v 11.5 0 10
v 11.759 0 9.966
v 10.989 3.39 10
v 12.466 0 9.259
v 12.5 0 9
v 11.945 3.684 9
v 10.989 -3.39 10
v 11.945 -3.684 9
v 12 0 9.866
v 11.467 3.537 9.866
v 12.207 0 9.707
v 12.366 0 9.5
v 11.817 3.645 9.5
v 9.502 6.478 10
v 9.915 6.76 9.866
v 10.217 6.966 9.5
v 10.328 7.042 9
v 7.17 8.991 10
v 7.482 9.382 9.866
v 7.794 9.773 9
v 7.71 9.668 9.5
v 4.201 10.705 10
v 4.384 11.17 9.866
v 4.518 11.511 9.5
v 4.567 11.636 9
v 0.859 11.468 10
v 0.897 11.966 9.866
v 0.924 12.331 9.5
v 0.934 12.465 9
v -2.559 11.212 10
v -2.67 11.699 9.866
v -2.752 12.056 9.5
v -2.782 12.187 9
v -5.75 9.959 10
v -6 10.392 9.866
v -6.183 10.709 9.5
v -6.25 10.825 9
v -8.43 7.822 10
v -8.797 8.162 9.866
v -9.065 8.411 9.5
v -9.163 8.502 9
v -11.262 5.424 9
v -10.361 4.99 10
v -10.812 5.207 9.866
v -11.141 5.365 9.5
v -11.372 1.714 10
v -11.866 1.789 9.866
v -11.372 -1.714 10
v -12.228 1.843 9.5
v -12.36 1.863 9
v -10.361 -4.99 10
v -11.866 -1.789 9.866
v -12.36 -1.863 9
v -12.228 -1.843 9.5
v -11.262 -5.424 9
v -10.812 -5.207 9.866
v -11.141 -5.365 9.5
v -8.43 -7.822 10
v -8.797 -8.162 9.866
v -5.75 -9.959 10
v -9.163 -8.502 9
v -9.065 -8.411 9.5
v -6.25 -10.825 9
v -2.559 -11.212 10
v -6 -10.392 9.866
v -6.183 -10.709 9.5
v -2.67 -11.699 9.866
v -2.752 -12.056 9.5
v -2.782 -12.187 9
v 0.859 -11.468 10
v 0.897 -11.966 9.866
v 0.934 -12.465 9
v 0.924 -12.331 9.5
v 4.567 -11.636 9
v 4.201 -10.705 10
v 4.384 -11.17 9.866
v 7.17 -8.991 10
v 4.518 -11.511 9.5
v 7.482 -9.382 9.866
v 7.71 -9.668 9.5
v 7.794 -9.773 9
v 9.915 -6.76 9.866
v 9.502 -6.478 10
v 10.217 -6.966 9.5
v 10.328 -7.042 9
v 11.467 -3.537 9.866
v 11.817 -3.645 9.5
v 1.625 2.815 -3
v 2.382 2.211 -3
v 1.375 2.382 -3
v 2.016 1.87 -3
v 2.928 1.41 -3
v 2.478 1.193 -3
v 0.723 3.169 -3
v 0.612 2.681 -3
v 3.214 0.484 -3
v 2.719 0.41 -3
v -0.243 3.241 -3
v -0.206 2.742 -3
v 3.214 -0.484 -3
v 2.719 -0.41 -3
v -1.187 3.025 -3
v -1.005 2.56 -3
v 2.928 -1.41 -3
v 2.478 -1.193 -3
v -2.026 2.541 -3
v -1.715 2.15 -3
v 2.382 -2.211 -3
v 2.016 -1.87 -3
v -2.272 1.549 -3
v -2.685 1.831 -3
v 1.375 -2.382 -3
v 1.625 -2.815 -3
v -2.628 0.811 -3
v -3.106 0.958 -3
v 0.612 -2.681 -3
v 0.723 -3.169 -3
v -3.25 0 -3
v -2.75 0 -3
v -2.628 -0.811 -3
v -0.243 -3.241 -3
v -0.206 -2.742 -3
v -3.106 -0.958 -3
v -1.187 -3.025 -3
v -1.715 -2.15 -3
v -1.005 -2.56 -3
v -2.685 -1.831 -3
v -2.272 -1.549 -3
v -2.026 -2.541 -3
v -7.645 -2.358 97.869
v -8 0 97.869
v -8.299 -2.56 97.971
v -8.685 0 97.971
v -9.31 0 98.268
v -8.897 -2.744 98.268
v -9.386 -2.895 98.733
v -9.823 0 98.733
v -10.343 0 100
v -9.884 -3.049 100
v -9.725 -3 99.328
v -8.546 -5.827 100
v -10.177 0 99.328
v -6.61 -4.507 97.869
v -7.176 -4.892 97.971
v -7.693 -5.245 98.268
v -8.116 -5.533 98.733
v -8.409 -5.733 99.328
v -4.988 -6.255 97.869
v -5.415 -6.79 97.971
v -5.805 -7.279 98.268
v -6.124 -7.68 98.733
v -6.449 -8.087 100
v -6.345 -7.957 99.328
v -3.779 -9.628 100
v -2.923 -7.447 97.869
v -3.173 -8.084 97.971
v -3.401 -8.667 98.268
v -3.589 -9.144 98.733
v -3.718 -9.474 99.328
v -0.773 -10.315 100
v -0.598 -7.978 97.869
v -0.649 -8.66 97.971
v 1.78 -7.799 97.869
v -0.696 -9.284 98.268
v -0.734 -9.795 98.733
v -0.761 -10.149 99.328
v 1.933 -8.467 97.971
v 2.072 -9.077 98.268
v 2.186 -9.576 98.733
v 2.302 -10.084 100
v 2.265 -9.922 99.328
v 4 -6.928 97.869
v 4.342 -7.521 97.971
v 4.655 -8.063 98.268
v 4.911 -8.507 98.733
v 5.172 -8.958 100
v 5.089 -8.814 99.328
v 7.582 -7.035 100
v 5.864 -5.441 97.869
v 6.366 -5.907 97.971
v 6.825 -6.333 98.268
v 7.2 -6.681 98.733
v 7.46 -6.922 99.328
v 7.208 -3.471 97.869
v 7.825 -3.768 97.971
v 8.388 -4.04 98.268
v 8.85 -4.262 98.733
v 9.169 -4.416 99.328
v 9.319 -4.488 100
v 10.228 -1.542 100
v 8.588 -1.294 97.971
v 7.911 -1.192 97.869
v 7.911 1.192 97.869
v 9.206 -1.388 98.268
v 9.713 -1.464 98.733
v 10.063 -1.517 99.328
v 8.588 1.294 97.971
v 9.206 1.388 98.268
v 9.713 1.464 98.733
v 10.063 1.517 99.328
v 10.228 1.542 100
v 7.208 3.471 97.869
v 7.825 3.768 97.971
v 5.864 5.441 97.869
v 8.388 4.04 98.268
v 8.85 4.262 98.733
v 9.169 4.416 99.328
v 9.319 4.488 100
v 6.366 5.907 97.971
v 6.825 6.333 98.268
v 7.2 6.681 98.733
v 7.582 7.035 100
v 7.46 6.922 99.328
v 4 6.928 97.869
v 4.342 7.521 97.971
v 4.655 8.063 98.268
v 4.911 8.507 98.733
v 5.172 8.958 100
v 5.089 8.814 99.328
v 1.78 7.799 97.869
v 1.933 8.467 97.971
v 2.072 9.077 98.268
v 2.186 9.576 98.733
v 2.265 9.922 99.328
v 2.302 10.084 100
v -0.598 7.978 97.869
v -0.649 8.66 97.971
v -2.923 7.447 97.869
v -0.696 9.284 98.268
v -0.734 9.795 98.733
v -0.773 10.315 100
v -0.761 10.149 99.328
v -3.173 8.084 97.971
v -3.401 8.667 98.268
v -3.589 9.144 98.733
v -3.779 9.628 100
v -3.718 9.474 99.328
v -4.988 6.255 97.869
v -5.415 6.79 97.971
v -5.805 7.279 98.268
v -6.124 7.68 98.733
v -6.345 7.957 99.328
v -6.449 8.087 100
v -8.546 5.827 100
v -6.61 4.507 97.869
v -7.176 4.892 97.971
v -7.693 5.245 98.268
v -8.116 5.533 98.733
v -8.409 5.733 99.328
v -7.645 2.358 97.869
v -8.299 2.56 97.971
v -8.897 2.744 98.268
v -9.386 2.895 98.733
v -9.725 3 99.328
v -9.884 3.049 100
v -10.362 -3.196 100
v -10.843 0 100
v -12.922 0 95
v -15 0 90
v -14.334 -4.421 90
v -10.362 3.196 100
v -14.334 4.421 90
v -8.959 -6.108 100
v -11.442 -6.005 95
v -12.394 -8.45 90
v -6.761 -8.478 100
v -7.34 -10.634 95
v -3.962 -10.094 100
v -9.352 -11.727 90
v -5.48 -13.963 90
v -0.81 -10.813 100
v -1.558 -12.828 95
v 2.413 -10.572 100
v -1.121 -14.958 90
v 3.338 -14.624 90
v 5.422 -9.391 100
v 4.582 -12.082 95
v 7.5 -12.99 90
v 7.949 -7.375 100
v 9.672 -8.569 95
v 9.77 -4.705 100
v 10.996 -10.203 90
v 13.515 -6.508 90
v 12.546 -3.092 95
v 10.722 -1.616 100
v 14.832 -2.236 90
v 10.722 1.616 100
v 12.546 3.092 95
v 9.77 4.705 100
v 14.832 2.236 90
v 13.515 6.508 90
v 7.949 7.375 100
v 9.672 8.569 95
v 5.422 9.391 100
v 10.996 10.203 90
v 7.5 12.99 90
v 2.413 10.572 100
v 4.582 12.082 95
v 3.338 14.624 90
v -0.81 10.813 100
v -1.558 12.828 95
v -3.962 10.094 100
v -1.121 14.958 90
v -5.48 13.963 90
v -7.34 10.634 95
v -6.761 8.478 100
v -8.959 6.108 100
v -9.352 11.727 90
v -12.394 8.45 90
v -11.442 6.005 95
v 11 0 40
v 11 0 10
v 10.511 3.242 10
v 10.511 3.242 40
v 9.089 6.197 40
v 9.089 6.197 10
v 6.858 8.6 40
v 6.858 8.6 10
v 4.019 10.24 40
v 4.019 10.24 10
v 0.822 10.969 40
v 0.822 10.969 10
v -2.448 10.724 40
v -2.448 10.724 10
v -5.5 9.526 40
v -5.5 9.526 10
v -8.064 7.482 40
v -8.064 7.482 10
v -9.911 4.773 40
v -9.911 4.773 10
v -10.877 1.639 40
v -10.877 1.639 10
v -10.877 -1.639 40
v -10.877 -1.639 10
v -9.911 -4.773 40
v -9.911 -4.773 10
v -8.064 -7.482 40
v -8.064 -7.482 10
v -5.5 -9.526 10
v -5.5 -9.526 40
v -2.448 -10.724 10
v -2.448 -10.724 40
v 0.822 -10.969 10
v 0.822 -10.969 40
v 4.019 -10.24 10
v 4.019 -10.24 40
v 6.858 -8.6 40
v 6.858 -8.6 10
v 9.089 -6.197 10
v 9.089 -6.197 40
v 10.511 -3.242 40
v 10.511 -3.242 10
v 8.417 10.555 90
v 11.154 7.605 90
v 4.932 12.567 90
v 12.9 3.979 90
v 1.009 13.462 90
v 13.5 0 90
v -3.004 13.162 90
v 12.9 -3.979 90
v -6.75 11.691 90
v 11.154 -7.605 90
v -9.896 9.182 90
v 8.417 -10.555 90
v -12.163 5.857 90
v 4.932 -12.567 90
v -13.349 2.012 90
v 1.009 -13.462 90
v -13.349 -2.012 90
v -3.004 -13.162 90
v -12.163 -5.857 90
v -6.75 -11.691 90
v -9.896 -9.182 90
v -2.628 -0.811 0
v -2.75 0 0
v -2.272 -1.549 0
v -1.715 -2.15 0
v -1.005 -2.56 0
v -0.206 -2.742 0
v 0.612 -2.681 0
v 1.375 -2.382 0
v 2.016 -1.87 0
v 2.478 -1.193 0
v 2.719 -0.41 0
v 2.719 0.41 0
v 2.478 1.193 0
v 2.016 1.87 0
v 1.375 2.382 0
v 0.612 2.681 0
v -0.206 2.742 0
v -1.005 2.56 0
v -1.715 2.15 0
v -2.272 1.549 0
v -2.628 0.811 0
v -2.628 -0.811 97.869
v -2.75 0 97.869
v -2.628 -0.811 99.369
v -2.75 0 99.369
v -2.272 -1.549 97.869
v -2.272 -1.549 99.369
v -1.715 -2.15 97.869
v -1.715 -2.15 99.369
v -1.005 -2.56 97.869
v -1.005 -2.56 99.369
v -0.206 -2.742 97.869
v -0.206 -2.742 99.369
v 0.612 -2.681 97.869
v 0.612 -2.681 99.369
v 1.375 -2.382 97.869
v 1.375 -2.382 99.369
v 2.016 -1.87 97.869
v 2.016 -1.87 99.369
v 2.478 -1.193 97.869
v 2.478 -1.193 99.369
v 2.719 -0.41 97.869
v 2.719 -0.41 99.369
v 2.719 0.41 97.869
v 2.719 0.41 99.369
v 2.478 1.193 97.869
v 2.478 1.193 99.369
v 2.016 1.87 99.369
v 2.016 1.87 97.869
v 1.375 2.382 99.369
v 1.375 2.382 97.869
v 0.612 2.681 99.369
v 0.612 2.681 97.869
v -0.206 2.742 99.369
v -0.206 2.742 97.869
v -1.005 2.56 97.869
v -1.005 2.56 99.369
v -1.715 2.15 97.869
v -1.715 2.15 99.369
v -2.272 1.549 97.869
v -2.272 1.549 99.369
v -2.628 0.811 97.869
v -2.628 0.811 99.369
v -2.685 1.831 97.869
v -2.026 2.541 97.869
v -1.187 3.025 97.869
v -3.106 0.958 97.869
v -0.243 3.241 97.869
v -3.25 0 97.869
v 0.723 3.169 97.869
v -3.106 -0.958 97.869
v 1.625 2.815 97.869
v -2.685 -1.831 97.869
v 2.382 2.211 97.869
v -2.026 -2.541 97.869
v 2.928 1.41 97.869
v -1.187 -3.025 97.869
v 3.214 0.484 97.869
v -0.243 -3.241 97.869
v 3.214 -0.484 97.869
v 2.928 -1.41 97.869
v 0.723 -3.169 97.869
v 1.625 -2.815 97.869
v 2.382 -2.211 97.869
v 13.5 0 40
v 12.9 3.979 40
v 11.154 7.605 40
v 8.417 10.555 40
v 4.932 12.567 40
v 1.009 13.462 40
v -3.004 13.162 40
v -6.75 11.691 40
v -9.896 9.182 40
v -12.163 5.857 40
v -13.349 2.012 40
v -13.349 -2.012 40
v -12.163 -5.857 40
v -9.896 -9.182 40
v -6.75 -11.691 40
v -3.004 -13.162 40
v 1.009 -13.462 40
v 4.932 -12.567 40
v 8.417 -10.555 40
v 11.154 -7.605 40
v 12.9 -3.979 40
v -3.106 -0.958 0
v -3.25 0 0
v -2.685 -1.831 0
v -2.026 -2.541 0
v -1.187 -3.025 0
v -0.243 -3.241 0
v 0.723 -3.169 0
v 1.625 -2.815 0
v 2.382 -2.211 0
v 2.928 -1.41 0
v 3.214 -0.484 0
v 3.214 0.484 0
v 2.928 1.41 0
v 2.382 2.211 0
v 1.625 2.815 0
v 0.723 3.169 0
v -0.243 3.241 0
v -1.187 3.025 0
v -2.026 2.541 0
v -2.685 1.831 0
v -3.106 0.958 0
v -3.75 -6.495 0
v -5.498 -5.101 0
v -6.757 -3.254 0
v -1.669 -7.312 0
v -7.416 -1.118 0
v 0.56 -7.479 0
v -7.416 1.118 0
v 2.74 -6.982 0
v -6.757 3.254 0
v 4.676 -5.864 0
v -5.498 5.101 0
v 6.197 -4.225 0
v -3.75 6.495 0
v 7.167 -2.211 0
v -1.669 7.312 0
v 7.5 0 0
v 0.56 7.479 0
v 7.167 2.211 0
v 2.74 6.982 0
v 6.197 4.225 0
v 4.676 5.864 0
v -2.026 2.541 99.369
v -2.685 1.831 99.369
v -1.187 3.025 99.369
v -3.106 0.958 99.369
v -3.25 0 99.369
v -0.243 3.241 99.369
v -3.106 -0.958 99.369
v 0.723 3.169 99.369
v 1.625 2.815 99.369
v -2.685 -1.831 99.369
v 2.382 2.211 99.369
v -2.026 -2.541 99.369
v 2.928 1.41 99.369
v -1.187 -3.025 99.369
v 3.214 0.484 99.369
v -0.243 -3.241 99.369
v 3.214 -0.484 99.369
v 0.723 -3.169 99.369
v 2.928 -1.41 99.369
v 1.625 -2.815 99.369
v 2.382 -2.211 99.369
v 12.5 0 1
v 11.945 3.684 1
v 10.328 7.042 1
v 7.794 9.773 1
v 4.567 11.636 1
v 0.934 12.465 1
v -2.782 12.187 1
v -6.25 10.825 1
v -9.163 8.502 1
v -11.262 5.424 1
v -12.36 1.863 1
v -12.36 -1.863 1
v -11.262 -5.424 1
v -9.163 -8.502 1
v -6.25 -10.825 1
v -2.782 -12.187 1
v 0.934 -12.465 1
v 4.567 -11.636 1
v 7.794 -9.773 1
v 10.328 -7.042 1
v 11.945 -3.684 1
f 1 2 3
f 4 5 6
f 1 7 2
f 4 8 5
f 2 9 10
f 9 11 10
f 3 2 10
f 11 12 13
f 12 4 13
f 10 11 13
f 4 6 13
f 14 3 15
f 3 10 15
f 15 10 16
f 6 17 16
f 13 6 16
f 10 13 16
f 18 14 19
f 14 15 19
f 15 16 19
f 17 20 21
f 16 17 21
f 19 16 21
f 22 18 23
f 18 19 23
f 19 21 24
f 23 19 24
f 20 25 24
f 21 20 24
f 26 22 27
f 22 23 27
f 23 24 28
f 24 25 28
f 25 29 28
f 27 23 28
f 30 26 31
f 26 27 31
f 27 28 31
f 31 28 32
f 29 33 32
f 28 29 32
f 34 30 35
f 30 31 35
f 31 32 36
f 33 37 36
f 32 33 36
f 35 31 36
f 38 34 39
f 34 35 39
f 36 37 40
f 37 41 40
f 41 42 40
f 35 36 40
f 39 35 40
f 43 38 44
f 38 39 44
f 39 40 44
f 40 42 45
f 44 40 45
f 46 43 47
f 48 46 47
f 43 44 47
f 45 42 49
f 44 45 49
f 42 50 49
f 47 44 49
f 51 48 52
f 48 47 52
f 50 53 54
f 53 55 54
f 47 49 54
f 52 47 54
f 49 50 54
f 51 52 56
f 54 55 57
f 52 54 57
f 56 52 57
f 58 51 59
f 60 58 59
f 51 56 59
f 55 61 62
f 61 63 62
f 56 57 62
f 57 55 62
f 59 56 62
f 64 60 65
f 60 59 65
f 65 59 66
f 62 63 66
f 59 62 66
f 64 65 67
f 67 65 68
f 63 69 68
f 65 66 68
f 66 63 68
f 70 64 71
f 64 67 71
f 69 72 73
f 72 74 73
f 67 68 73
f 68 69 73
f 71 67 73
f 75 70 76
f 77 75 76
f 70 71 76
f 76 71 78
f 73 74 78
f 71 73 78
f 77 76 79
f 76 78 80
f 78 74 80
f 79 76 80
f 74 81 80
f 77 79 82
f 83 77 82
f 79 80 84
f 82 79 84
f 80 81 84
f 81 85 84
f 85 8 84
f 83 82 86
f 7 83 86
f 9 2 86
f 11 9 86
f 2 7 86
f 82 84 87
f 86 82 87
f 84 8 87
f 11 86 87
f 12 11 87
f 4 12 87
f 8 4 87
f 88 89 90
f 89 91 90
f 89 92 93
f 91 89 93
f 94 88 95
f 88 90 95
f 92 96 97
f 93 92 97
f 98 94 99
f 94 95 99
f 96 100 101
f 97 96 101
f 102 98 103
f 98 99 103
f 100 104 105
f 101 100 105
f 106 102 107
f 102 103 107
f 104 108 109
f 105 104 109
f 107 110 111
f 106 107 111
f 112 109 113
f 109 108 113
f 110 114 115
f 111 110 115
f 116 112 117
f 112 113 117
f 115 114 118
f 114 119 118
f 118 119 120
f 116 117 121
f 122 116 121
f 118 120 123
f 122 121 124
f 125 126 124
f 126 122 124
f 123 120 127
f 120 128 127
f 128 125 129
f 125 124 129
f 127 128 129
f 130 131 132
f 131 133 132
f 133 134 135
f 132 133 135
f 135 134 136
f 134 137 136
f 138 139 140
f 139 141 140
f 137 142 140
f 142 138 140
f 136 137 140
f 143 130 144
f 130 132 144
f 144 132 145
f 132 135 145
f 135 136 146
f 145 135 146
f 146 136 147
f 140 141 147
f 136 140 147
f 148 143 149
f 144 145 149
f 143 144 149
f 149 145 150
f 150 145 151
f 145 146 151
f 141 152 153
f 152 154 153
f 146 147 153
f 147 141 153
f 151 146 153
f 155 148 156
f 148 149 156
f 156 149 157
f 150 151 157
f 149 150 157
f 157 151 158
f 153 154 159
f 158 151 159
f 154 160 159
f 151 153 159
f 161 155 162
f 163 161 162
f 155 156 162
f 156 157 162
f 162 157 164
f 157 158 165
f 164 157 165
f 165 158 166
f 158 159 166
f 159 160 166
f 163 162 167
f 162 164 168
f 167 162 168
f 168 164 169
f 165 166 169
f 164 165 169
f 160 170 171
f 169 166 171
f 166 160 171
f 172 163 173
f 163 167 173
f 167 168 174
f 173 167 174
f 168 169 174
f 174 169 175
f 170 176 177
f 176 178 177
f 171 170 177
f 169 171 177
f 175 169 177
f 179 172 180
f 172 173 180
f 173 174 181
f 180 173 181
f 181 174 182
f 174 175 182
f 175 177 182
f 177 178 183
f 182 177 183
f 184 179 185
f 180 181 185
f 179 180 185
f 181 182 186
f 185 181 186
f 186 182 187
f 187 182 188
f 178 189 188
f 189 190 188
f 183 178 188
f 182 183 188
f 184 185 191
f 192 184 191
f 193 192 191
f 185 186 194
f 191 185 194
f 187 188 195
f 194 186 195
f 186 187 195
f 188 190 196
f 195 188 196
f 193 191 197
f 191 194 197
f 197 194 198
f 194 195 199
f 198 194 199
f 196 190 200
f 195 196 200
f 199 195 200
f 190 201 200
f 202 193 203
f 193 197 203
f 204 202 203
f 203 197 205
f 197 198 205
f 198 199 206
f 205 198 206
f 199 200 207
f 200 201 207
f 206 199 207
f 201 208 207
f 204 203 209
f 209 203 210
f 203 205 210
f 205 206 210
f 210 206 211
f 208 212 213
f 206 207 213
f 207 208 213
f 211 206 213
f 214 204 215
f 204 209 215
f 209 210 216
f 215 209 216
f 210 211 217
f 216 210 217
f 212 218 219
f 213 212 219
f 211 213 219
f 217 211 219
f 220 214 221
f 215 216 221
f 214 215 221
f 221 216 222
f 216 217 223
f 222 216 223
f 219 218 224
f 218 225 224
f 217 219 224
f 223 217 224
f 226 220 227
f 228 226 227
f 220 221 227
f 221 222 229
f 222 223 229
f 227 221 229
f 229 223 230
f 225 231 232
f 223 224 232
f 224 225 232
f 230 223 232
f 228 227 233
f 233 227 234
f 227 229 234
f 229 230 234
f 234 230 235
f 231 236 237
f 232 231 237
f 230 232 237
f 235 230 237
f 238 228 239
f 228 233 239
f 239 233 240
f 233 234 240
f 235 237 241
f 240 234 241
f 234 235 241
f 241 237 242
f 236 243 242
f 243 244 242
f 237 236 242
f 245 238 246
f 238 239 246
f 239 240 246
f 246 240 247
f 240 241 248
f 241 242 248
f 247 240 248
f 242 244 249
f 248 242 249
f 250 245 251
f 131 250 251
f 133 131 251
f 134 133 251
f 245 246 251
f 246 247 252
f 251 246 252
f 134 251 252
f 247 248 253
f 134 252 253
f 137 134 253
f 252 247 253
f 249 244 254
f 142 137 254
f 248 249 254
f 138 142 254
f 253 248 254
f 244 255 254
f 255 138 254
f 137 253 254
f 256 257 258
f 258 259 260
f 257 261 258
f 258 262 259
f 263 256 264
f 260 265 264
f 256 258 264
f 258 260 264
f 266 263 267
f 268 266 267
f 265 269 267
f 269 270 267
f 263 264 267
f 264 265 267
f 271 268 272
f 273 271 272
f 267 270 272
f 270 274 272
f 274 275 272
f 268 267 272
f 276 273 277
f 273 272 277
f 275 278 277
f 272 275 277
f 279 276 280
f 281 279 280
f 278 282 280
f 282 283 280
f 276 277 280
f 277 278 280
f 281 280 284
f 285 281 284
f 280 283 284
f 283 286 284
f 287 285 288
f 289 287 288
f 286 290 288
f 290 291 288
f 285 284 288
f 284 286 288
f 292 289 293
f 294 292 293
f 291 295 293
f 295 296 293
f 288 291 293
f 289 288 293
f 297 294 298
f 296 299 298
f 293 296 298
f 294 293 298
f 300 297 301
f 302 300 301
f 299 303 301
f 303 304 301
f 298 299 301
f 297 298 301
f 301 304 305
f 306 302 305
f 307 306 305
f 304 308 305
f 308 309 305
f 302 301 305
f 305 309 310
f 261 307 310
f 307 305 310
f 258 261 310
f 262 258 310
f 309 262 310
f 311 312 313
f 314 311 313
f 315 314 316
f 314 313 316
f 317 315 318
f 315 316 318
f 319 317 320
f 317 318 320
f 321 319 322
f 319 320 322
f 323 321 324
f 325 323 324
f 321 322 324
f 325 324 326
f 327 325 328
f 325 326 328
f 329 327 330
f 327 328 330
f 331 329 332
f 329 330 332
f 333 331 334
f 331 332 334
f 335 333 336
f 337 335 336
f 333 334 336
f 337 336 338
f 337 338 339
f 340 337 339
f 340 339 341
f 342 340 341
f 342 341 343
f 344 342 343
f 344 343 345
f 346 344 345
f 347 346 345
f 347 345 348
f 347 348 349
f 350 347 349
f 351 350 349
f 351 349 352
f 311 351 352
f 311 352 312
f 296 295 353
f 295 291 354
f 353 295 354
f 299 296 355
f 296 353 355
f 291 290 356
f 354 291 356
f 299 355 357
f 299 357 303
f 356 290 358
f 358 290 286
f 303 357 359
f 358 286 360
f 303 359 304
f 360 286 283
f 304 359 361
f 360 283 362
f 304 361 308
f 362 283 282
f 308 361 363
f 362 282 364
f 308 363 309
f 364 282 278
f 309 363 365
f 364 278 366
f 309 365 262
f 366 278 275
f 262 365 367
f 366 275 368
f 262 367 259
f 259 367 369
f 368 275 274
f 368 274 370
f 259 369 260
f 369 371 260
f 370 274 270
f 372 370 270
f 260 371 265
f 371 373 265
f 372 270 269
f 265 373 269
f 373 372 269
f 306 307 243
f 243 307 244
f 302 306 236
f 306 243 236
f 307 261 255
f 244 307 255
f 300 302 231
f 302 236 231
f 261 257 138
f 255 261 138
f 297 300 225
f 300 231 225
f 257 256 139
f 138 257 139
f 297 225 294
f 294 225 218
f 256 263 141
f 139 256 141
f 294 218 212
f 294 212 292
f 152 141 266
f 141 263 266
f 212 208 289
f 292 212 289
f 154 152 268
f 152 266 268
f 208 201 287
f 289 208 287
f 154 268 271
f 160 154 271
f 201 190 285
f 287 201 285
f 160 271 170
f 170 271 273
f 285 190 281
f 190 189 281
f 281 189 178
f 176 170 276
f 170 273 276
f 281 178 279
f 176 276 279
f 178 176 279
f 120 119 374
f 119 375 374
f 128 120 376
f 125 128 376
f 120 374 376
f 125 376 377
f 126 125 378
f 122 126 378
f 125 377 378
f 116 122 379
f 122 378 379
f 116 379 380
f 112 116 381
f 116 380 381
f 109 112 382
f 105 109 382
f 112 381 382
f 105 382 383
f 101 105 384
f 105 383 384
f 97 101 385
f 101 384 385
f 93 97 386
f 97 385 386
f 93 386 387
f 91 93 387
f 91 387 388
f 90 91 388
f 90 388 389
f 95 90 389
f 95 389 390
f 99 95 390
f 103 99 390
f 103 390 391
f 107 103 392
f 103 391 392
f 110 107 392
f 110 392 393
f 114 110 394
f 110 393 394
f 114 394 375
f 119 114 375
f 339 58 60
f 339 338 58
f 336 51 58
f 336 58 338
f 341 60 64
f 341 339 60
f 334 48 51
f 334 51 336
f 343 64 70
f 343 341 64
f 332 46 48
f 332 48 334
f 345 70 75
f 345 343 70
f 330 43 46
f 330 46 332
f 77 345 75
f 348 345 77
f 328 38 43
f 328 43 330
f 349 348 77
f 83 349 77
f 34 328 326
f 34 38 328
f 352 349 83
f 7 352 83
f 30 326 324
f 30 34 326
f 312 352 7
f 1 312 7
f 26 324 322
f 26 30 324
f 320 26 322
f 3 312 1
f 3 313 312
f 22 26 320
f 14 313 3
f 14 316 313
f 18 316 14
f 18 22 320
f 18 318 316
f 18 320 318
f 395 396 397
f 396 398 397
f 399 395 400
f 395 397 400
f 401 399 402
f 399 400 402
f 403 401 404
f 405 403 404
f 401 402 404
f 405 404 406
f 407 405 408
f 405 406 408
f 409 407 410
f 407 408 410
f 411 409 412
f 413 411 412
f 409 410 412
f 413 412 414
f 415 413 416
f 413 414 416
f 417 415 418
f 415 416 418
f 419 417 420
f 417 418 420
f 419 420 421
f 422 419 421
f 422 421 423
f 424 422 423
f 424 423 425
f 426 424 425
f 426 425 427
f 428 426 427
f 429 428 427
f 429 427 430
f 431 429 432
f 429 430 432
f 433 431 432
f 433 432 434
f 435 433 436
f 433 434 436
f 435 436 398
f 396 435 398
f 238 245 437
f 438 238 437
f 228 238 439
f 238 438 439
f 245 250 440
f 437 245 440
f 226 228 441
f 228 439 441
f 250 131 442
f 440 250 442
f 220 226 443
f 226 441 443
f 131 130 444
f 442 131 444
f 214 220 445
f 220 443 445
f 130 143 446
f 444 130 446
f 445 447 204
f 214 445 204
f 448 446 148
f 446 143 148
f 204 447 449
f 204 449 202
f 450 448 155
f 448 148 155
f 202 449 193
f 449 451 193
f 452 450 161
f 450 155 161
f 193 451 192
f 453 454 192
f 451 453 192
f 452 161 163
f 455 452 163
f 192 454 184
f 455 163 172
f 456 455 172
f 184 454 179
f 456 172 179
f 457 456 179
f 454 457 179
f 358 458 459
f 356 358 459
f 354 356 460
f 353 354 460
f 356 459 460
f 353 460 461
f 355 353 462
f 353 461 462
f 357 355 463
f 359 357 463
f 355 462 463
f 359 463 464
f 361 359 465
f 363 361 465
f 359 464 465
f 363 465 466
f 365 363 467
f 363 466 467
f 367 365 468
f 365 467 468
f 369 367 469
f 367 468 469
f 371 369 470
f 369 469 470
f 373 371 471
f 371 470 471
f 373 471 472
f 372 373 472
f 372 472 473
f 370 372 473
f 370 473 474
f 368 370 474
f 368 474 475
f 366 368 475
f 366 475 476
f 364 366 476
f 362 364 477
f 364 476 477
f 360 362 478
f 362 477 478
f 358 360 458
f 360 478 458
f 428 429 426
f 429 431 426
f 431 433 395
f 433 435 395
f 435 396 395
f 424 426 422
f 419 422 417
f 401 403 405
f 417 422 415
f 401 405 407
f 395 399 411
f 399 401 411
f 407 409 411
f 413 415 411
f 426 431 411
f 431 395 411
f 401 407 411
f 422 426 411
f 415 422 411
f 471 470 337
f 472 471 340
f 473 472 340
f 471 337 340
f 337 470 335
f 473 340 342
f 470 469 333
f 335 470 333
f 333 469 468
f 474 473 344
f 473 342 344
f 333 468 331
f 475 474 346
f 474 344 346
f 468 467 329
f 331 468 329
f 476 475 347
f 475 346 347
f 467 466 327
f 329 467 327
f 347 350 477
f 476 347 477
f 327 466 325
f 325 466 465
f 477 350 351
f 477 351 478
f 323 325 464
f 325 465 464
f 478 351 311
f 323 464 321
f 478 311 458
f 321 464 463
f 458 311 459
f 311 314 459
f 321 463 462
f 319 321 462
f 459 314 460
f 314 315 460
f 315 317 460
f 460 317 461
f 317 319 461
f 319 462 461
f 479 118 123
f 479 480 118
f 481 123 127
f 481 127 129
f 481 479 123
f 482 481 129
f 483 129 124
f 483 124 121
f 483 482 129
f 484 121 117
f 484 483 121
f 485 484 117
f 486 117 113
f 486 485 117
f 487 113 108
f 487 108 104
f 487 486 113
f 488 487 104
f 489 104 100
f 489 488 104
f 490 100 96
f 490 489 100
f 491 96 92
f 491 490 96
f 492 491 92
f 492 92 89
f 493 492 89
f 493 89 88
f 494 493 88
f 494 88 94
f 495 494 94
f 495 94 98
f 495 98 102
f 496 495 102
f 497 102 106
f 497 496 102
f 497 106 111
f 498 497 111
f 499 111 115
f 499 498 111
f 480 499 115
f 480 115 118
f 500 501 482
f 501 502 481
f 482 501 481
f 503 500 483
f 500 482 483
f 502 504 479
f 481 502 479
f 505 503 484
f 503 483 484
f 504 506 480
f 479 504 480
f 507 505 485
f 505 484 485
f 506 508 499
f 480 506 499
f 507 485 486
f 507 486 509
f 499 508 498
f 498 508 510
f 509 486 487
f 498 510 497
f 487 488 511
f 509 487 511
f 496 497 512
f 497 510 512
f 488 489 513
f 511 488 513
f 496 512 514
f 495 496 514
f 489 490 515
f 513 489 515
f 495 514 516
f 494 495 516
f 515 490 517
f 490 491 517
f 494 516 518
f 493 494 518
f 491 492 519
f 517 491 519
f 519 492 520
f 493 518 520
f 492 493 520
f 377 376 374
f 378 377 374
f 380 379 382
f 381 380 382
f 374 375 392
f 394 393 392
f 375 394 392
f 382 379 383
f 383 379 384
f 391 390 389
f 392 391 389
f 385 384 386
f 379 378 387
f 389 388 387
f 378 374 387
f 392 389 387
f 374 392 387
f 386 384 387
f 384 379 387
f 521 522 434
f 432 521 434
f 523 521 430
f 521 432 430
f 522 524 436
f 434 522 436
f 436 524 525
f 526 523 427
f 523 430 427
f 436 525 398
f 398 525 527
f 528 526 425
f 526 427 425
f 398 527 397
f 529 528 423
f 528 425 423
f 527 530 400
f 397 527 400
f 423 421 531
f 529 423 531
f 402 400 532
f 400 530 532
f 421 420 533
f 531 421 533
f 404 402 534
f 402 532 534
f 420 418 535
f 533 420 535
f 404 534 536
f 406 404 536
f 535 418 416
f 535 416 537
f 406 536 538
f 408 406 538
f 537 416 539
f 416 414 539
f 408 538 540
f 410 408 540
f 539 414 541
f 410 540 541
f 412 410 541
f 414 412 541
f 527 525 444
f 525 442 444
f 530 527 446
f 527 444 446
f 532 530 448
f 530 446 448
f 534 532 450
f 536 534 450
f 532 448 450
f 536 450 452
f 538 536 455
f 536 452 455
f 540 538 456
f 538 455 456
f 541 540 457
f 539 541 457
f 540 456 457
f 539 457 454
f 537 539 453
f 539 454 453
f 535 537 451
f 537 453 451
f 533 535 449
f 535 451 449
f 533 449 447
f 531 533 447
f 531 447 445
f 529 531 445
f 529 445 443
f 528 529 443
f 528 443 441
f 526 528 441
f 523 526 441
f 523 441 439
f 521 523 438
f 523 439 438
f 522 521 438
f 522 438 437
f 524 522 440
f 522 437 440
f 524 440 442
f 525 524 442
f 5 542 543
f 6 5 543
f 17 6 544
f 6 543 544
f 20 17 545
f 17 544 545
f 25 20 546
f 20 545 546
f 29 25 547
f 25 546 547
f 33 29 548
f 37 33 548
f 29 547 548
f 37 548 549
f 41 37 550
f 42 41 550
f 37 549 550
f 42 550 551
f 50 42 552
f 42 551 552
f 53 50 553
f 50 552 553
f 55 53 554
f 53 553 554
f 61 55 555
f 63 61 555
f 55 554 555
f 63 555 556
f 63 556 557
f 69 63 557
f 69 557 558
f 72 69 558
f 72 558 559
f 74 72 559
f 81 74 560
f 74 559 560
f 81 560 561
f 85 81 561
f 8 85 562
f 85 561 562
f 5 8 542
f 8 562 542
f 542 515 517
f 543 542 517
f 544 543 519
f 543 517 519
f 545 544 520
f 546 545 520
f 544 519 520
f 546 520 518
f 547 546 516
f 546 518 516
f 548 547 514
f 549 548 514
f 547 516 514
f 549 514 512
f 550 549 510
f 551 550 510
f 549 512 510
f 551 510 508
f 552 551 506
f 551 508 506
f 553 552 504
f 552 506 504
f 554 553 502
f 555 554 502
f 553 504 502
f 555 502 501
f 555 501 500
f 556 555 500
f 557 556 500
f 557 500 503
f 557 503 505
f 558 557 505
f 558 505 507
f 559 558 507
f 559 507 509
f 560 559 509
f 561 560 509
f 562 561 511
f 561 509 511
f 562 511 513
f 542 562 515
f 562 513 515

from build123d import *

# Parameters (mm, degrees)
F0_R     = 11
F1_DEPTH = 90
F0_R_2   = 12.5
F2_DEPTH = 10
F3_START = 40
F0_R_3   = 13.5
F3_DEPTH = 50
F4_W     = 0.5
F4_H     = 3
F6_R     = 1
F7_SIZE2 = 5
F7_SIZE  = 1


with BuildPart() as f1:
    # F0 (on Top) → F1 (new body)
    with BuildSketch(Plane.XY):
        Circle(F0_R)
    extrude(amount=F1_DEPTH)

    # F0 (on Top) → F2 (join)
    with BuildSketch(Plane.XY):
        Circle(F0_R_2)
        Circle(F0_R, mode=Mode.SUBTRACT)
    extrude(amount=F2_DEPTH)

    # F0 (on Top) → F3 (join)
    with BuildSketch(Plane.XY.offset(F3_START)):
        Circle(F0_R_3)
        Circle(F0_R_2, mode=Mode.SUBTRACT)
        Circle(F0_R_2)
        Circle(F0_R, mode=Mode.SUBTRACT)
    extrude(amount=F3_DEPTH)

    # F4 (on Front) → F5 (revolve)
    with BuildSketch(Plane.XZ):
        with BuildLine():
            Line((-15, 90), (0, 90))
            Line((0, 90), (0, 97.8694483638))
            Line((0, 97.8694483638), (-2.75, 97.8694483638))
            Line((-2.75, 97.8694483638), (-2.75, 99.3694483638))
            Line((-2.75, 99.3694483638), (-3.25, 99.3694483638))
            Line((-3.25, 99.3694483638), (-3.25, 97.8694483638))
            Line((-3.25, 97.8694483638), (-8, 97.8694483638))
            ThreePointArc((-8, 97.8694483638), (-9.5836049581, 98.4817025568), (-10.343494907, 100))
            Line((-10.343494907, 100), (-10.843494907, 100))
            Line((-10.843494907, 100), (-15, 90))
        make_face()
        with Locations((-3, -1.5)):
            Rectangle(F4_W, F4_H)
    revolve(axis=Axis((0, 0, 93.9347241819), (0, 0, 1)))

    # F6
    f6_edges = [f1.edges().sort_by_distance(p)[0] for p in [
        (-12.5, 0, 10),
    ]]
    fillet(f6_edges, radius=F6_R)

    # F7
    f7_edges = [f1.edges().sort_by_distance(p)[0] for p in [
        (-12.5, 0, 0),
    ]]
    f7_side = f1.faces().sort_by_distance((-12.5, 0, 4.5))[0]
    chamfer(f7_edges, length=F7_SIZE, length2=F7_SIZE2, reference=f7_side)


solid = f1.part
